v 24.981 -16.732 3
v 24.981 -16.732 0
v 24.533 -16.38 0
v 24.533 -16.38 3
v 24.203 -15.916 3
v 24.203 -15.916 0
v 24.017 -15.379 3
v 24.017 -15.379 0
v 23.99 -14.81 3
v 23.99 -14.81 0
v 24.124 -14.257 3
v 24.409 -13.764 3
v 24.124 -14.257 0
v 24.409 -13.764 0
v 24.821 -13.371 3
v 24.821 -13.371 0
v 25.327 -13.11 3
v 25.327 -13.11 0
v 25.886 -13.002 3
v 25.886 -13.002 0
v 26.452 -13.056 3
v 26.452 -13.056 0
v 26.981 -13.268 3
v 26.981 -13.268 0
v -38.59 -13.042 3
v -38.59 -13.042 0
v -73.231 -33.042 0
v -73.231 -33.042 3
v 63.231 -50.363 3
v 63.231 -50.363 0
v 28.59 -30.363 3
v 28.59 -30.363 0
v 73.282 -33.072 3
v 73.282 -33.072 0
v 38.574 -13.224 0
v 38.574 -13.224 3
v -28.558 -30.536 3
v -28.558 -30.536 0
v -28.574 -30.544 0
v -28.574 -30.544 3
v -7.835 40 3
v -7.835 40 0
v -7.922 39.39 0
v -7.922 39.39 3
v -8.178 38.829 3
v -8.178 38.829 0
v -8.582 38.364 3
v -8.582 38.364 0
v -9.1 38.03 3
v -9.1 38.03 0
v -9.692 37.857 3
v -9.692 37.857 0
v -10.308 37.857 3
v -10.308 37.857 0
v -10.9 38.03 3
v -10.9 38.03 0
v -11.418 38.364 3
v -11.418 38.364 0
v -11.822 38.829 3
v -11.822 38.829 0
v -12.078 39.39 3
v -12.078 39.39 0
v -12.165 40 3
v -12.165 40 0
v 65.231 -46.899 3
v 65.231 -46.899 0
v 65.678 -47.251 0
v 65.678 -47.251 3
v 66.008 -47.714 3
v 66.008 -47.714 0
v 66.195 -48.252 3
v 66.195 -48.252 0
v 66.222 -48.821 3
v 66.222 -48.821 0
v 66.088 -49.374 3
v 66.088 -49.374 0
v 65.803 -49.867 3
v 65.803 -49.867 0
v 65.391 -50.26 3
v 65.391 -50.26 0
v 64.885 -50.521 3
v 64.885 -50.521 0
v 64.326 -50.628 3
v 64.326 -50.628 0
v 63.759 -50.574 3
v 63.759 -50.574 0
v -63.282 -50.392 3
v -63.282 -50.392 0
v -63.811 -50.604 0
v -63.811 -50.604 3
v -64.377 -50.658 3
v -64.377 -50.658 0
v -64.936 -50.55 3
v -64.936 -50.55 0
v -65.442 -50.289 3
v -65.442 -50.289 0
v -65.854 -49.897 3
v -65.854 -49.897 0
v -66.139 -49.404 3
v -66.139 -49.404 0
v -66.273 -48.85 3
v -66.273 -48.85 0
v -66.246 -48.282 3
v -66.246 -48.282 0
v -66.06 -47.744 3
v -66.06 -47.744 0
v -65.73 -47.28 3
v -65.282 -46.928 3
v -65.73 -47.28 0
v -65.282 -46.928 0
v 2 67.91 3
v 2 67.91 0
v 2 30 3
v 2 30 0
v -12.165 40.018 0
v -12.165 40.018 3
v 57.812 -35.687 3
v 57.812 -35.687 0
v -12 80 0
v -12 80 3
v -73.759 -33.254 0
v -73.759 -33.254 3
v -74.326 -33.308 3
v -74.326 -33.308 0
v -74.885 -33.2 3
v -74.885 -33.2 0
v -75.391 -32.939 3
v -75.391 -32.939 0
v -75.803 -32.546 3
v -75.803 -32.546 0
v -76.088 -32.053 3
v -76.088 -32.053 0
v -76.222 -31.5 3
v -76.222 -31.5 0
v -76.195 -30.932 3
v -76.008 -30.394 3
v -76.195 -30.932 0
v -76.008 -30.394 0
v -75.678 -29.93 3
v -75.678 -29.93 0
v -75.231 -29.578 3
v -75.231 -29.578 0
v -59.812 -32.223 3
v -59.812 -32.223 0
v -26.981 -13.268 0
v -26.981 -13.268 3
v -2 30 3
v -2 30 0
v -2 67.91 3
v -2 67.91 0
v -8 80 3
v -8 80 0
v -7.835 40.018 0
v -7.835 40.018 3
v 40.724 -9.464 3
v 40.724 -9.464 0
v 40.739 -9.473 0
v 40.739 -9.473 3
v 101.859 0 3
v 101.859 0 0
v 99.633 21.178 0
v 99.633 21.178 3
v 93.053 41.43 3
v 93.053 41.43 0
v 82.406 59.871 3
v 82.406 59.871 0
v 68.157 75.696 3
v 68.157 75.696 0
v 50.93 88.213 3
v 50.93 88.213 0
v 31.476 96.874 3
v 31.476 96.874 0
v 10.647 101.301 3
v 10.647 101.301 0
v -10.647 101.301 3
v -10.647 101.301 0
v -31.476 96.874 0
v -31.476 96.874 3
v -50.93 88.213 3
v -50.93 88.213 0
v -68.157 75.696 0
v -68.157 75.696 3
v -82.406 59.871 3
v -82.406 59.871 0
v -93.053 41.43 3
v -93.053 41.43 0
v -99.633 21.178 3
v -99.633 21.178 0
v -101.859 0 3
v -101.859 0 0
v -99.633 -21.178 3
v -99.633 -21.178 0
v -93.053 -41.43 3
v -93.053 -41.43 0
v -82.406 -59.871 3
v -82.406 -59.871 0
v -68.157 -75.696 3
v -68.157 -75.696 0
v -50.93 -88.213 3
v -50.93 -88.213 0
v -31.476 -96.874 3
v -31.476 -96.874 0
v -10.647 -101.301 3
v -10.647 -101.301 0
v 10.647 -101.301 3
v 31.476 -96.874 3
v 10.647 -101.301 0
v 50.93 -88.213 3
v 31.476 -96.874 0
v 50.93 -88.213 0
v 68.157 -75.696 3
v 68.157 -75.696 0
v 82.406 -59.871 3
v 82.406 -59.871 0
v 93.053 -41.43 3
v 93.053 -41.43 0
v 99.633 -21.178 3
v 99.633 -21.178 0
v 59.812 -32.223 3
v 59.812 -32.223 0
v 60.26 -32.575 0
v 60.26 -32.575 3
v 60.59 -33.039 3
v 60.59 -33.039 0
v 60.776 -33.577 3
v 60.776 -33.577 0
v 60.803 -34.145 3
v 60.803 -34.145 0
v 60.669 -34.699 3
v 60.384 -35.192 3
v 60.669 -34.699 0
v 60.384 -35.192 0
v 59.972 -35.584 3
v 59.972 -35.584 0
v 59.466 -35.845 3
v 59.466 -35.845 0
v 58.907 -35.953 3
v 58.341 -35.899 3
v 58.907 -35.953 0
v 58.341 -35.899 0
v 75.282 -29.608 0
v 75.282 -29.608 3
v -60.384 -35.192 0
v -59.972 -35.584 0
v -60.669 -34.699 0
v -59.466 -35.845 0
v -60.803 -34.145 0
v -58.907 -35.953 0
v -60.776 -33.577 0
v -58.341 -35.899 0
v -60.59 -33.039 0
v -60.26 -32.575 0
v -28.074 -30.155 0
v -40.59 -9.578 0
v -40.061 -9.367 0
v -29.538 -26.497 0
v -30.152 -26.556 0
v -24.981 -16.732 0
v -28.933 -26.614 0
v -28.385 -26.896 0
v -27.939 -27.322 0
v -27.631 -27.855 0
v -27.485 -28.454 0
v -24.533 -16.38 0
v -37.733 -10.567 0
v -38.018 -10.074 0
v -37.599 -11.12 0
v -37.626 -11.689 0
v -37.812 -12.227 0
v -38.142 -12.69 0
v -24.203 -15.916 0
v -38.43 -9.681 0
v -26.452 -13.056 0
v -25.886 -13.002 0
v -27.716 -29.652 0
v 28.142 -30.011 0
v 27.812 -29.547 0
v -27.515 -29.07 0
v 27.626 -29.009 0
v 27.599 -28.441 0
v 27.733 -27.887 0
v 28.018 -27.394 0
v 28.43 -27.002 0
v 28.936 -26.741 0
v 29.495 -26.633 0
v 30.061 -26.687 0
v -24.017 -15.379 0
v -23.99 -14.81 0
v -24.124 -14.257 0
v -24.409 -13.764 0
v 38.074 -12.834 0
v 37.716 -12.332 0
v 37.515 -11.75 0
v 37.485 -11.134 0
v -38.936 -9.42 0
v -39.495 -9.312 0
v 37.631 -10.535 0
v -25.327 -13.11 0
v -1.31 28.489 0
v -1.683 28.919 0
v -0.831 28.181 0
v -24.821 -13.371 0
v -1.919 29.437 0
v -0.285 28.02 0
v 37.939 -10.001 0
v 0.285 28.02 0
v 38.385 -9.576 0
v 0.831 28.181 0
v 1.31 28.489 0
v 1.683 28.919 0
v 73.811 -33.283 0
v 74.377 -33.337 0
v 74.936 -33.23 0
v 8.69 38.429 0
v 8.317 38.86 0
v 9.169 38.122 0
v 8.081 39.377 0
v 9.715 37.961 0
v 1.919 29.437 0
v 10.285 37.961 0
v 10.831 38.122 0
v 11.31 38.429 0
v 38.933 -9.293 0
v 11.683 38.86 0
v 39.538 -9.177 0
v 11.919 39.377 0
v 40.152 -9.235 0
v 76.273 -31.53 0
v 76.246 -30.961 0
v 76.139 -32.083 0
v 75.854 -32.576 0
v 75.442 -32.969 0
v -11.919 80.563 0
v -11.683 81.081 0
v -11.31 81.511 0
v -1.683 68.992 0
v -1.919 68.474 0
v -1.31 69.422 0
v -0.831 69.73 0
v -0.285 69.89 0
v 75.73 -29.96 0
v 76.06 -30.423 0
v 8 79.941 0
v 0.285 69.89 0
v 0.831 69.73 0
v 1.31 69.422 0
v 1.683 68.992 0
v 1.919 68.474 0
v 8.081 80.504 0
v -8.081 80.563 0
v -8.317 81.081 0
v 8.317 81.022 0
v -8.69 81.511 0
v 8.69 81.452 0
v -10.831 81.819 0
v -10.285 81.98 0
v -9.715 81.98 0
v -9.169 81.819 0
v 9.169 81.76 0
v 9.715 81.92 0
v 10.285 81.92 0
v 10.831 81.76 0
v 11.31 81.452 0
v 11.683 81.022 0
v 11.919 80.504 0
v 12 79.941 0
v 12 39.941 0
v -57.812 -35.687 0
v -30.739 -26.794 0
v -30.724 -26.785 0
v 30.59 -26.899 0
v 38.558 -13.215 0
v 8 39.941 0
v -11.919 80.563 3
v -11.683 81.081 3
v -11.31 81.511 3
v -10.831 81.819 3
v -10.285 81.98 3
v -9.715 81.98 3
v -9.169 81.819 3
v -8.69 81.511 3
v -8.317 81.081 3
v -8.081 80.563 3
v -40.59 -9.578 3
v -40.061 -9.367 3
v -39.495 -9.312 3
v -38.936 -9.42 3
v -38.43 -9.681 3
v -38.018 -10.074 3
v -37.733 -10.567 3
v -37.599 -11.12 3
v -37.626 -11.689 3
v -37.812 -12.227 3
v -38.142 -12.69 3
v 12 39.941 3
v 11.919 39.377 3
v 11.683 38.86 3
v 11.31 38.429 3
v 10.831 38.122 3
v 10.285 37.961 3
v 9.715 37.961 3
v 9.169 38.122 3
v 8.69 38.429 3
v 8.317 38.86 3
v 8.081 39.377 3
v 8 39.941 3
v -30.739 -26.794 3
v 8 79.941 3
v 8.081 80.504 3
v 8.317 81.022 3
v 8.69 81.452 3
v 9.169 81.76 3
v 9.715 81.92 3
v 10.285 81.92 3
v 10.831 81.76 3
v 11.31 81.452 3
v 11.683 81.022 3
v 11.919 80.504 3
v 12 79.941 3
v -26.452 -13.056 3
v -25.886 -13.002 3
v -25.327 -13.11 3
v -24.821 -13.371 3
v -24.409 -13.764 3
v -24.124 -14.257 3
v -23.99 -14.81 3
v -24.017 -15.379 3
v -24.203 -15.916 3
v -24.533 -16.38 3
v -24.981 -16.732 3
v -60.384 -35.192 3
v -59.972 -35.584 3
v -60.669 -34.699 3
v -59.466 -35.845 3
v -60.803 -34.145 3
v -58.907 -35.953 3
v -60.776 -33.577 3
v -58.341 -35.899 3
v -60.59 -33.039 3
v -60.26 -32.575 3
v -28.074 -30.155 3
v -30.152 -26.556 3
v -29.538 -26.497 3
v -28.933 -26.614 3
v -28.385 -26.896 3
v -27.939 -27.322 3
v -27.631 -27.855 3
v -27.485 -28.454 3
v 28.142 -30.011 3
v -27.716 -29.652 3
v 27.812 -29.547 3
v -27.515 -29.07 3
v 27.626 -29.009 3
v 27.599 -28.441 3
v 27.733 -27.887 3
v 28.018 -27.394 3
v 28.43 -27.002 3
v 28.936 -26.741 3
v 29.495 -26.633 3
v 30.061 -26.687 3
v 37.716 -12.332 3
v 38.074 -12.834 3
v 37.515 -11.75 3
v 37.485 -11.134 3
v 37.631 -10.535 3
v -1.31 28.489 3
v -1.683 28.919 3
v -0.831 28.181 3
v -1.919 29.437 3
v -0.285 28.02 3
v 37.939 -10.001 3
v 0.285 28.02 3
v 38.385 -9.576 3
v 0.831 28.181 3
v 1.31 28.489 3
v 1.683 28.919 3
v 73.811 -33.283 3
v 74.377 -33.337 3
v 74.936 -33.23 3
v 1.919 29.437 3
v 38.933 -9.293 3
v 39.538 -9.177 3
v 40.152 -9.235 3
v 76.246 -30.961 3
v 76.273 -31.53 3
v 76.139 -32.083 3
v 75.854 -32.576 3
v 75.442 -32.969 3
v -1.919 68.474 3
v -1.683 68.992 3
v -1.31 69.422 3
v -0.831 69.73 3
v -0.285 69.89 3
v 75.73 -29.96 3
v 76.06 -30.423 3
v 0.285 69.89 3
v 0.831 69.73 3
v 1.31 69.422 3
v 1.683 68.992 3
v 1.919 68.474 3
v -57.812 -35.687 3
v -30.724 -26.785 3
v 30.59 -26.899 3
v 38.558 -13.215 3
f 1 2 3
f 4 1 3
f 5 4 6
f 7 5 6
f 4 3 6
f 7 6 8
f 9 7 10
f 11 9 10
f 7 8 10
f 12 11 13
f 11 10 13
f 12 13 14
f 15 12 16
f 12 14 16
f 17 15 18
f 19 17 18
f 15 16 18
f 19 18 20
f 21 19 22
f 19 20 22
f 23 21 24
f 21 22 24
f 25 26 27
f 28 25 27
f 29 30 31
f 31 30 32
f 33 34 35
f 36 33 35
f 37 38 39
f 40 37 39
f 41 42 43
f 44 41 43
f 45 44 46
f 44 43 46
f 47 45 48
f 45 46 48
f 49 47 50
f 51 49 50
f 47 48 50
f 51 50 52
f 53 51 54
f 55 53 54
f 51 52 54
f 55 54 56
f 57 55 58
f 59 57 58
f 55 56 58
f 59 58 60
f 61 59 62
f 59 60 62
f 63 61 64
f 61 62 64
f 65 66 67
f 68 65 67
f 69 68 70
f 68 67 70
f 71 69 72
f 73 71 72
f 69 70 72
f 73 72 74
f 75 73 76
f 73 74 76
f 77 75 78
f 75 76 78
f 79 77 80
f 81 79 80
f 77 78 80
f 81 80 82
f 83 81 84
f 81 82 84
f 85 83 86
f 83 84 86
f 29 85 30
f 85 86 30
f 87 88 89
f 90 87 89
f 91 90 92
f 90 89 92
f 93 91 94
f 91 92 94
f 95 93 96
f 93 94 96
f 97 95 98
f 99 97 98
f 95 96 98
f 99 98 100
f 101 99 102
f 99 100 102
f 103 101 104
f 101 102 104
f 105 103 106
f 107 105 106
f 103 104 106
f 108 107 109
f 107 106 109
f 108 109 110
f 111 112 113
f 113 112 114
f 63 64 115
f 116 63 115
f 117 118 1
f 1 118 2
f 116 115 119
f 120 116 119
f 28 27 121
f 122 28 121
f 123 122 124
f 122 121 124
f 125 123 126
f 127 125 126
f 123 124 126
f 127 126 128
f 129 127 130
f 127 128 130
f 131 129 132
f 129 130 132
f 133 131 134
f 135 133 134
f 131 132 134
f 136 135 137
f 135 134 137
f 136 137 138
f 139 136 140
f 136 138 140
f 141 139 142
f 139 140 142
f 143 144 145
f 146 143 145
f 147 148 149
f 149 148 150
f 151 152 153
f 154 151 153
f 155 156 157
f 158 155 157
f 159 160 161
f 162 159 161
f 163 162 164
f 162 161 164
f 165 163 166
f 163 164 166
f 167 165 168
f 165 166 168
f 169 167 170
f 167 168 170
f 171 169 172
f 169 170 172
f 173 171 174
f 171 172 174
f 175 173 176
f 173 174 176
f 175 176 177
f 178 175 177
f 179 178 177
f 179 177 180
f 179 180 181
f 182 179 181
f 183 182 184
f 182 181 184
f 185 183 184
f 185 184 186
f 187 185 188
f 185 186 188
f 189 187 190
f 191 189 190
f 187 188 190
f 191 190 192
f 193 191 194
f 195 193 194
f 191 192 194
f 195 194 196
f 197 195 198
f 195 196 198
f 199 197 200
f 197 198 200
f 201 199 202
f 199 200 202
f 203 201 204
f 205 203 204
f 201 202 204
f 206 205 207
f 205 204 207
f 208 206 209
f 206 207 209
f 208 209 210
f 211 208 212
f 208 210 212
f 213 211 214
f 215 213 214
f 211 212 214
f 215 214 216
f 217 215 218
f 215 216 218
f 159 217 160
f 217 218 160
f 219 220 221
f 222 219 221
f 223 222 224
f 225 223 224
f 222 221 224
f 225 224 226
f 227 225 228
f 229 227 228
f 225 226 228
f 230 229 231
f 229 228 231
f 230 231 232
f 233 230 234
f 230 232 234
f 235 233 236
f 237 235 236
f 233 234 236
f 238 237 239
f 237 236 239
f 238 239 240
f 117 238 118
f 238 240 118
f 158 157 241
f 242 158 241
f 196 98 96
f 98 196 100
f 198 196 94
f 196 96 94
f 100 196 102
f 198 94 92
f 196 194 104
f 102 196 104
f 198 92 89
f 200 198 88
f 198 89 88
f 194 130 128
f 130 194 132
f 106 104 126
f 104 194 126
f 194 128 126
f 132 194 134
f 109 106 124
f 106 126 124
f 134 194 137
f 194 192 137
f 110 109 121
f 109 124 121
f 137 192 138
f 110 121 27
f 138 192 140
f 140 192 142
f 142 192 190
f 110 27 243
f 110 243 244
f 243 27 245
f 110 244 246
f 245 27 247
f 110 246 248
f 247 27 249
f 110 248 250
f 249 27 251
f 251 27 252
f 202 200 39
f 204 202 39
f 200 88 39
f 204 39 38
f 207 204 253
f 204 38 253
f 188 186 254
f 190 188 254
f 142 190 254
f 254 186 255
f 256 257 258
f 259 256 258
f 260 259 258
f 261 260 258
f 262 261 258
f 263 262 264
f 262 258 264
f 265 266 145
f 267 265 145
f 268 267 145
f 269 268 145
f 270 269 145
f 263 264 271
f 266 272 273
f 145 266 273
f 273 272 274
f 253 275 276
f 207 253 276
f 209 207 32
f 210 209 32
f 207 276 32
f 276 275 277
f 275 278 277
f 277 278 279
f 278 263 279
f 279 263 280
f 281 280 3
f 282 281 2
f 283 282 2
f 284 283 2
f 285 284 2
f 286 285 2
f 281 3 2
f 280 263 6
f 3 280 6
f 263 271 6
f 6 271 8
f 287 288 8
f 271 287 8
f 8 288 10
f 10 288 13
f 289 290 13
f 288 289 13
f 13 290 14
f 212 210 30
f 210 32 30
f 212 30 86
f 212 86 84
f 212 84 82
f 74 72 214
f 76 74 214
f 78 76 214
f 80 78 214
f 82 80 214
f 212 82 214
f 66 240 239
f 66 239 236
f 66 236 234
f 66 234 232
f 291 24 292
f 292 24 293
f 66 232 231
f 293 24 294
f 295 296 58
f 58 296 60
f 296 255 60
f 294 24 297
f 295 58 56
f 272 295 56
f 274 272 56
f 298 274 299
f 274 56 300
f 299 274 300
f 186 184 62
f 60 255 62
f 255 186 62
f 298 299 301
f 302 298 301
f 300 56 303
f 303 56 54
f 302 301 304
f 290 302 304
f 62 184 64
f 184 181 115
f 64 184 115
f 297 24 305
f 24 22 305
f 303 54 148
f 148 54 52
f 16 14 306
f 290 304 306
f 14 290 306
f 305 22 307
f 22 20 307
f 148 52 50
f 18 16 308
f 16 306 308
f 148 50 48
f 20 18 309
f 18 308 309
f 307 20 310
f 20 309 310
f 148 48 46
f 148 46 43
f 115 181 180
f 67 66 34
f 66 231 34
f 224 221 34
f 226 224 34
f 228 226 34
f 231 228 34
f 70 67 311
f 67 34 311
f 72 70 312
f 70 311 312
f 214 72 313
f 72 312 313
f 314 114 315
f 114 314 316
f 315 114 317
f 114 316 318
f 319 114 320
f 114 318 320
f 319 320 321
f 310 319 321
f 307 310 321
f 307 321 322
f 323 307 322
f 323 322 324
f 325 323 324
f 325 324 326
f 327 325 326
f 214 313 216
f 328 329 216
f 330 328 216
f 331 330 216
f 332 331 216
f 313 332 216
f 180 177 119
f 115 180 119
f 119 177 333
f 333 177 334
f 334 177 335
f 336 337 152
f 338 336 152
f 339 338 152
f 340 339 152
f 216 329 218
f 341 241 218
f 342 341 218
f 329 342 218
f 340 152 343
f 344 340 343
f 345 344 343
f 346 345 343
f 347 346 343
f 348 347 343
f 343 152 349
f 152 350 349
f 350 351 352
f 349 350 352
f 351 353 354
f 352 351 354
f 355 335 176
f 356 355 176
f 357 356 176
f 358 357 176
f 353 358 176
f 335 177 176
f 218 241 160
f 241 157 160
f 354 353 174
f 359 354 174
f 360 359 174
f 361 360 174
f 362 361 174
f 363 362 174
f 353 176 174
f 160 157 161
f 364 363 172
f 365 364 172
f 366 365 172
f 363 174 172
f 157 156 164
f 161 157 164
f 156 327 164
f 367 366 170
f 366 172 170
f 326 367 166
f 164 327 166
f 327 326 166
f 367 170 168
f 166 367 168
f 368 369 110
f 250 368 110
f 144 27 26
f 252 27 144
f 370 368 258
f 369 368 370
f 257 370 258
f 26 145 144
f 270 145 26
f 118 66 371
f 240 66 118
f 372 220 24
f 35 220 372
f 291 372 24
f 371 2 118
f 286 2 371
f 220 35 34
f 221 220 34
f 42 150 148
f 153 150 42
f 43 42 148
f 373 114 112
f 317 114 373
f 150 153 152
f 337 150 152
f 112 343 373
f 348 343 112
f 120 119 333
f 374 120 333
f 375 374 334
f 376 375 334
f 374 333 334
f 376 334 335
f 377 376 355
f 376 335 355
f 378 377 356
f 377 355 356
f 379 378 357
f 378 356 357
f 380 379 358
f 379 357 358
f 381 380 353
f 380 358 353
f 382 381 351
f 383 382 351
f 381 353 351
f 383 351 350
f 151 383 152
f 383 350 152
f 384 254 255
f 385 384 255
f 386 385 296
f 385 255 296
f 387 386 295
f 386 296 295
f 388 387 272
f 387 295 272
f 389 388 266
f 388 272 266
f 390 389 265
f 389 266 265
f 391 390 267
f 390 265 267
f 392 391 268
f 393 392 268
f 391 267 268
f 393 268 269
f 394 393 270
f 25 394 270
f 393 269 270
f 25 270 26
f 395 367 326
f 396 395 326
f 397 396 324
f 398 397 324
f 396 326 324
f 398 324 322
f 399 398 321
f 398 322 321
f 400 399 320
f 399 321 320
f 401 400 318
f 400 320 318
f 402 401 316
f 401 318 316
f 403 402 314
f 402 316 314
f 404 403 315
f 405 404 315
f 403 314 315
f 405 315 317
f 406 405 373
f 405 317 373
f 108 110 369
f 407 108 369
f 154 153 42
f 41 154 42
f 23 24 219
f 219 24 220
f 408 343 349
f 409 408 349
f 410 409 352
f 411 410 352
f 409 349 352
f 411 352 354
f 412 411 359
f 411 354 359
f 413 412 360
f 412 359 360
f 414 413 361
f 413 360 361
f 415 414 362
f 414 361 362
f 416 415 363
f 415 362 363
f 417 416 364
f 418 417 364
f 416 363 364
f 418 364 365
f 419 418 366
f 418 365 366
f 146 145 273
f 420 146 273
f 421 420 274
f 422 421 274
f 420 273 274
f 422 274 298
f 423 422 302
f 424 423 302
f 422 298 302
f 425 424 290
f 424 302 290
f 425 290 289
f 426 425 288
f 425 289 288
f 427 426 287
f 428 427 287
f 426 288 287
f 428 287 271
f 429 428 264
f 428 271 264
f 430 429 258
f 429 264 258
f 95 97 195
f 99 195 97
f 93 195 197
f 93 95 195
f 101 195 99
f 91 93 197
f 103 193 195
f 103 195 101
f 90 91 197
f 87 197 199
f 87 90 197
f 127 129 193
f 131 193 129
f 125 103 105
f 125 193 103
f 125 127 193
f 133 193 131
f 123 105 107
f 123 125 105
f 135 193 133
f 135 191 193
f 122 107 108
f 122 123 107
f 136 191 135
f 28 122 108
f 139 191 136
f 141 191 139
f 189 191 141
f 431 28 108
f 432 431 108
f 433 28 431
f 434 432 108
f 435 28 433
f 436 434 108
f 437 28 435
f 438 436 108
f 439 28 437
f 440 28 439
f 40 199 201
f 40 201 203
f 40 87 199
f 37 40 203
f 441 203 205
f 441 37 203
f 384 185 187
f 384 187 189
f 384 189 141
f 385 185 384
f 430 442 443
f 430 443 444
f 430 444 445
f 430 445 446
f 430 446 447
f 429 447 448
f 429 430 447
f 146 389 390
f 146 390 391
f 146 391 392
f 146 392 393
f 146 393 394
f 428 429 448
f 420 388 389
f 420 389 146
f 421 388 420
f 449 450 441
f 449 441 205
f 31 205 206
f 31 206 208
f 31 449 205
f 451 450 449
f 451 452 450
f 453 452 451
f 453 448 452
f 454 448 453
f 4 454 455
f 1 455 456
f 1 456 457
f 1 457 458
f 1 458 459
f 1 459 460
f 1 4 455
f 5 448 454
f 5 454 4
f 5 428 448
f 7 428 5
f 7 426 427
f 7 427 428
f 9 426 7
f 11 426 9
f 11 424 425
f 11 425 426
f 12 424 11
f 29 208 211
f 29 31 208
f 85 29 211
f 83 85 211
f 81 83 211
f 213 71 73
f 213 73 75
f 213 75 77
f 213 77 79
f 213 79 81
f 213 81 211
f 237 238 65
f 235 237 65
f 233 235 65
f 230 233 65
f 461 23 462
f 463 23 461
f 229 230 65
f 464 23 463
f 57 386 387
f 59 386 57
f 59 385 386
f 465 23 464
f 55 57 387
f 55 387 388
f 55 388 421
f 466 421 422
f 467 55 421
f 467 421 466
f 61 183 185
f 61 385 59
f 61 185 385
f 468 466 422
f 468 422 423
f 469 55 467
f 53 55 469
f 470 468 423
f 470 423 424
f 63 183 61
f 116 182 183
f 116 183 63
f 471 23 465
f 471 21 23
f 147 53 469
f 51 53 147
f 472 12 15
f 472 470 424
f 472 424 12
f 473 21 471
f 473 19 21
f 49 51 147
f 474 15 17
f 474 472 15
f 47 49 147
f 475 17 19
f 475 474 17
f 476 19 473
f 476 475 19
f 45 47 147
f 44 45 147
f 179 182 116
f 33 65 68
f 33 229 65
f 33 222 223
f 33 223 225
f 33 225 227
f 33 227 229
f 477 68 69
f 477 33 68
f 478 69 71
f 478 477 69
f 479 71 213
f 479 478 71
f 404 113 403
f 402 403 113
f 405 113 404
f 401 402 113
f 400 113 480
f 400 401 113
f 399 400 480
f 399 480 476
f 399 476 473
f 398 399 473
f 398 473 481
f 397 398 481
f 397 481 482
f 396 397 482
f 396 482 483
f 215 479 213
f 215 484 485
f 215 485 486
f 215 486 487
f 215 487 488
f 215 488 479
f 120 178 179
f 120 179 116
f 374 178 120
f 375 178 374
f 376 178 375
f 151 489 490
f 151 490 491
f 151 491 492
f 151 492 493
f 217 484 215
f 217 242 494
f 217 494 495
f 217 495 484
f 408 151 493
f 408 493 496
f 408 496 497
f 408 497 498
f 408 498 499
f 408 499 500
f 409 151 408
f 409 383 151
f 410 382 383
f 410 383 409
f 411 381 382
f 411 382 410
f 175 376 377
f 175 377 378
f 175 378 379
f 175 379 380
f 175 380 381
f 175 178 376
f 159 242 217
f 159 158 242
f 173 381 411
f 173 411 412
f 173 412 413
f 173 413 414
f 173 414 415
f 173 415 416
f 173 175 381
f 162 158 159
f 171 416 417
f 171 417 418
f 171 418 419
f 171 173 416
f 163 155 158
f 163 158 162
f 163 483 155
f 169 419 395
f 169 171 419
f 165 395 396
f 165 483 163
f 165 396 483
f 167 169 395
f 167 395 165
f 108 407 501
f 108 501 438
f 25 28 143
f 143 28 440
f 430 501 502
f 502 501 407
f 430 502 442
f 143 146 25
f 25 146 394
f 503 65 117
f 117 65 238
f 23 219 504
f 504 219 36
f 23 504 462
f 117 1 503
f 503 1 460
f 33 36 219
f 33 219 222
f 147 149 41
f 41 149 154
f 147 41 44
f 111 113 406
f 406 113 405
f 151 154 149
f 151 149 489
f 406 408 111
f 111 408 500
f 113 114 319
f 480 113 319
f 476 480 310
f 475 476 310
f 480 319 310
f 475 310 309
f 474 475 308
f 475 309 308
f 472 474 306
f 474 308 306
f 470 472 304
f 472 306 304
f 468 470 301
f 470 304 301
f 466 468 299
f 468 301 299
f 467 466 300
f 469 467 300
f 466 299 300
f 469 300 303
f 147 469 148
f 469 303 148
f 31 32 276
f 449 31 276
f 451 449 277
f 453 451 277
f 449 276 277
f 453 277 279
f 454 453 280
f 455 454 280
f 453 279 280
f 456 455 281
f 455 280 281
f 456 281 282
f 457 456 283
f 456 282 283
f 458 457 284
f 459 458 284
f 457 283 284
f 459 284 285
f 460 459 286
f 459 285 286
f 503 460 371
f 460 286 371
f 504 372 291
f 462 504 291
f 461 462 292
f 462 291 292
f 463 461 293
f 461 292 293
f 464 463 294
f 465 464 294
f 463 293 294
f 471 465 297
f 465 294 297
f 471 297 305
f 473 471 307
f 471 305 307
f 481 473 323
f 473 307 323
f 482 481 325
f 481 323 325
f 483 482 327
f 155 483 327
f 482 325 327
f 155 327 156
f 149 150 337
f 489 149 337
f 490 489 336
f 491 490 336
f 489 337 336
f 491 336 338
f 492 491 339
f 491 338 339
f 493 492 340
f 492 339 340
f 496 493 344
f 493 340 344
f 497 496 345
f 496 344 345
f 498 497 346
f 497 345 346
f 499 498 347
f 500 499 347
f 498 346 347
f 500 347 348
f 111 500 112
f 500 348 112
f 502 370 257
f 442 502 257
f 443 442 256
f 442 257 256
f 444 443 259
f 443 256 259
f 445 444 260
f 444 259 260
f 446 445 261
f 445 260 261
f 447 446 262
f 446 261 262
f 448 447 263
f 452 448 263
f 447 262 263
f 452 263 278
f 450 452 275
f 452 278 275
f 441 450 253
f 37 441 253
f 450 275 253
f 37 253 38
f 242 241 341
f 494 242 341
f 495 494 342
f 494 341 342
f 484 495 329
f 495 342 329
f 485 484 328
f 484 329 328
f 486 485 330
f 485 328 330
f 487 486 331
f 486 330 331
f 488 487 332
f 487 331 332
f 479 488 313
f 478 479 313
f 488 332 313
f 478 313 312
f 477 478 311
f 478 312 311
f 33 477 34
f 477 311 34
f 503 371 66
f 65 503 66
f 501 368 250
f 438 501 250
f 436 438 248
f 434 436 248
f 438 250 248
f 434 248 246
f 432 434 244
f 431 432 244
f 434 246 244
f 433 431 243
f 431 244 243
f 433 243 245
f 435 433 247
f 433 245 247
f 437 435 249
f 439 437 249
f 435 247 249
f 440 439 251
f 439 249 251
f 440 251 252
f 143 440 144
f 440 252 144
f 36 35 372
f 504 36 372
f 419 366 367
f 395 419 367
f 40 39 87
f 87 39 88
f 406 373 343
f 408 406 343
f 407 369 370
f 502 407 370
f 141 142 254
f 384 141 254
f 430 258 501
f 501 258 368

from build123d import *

# Parameters (mm, degrees)
SKETCH1_R           = 101.859163579
BOSS_EXTRUDE1_DEPTH = 3


with BuildPart() as part:
    # Sketch1 → Boss-Extrude1 (new body)
    with BuildSketch(Plane.XY):
        Circle(SKETCH1_R)
        with BuildLine():
            Line((-38.589791853, -13.042222407), (-73.230808005, -33.042222407))
            ThreePointArc((-73.230808005, -33.042222407), (-75.962858812, -32.3101716), (-75.230808005, -29.578120792))
            Line((-75.230808005, -29.578120792), (-40.589791853, -9.578120792))
            ThreePointArc((-40.589791853, -9.578120792), (-37.857741046, -10.3101716), (-38.589791853, -13.042222407))
        make_face(mode=Mode.SUBTRACT)
        with BuildLine():
            Line((-28.573863011, -30.544431757), (-63.282032303, -50.392304845))
            ThreePointArc((-63.282032303, -50.392304845), (-66.01408311, -49.660254038), (-65.282032303, -46.92820323))
            Line((-65.282032303, -46.92820323), (-30.739185351, -26.793983449))
            Line((-30.739185351, -26.793983449), (-30.723714344, -26.78496576))
            ThreePointArc((-30.723714344, -26.78496576), (-27.765727873, -27.577555846), (-28.558317959, -30.535542316))
            Line((-28.558317959, -30.535542316), (-28.573863011, -30.544431757))
        make_face(mode=Mode.SUBTRACT)
        with BuildLine():
            Line((-24.980762114, -16.732050808), (-57.812135025, -35.687252796))
            ThreePointArc((-57.812135025, -35.687252796), (-60.544185832, -34.955201988), (-59.812135025, -32.223151181))
            Line((-59.812135025, -32.223151181), (-26.980762114, -13.267949192))
            ThreePointArc((-26.980762114, -13.267949192), (-24.248711306, -14), (-24.980762114, -16.732050808))
        make_face(mode=Mode.SUBTRACT)
        with BuildLine():
            Line((30.589791853, -26.898628868), (65.230808005, -46.898628868))
            ThreePointArc((65.230808005, -46.898628868), (65.962858812, -49.630679675), (63.230808005, -50.362730483))
            Line((63.230808005, -50.362730483), (28.589791853, -30.362730483))
            ThreePointArc((28.589791853, -30.362730483), (27.857741046, -27.630679675), (30.589791853, -26.898628868))
        make_face(mode=Mode.SUBTRACT)
        with BuildLine():
            Line((26.980762114, -13.267949192), (59.812135025, -32.223151181))
            ThreePointArc((59.812135025, -32.223151181), (60.544185832, -34.955201988), (57.812135025, -35.687252796))
            Line((57.812135025, -35.687252796), (24.980762114, -16.732050808))
            ThreePointArc((24.980762114, -16.732050808), (24.248711306, -14), (26.980762114, -13.267949192))
        make_face(mode=Mode.SUBTRACT)
        with BuildLine():
            Line((40.739185351, -9.473475374), (75.282032303, -29.607695155))
            ThreePointArc((75.282032303, -29.607695155), (76.01408311, -32.339745962), (73.282032303, -33.07179677))
            Line((73.282032303, -33.07179677), (38.573863011, -13.223923681))
            Line((38.573863011, -13.223923681), (38.558317959, -13.21503424))
            ThreePointArc((38.558317959, -13.21503424), (37.765727873, -10.25704777), (40.723714344, -9.464457684))
            Line((40.723714344, -9.464457684), (40.739185351, -9.473475374))
        make_face(mode=Mode.SUBTRACT)
        with BuildLine():
            Line((-2, 30), (-2, 67.910403976))
            ThreePointArc((-2, 67.910403976), (0, 69.910403976), (2, 67.910403976))
            Line((2, 67.910403976), (2, 30))
            ThreePointArc((2, 30), (0, 28), (-2, 30))
        make_face(mode=Mode.SUBTRACT)
        with BuildLine():
            Line((-12.16532234, 40.01790713), (-12, 80))
            ThreePointArc((-12, 80), (-10, 82), (-8, 80))
            Line((-8, 80), (-7.83467766, 40.01790713))
            Line((-7.83467766, 40.01790713), (-7.834603616, 40))
            ThreePointArc((-7.834603616, 40), (-10, 37.834603616), (-12.165396384, 40))
            Line((-12.165396384, 40), (-12.16532234, 40.01790713))
        make_face(mode=Mode.SUBTRACT)
        with BuildLine():
            Line((8, 39.940851275), (8, 79.940851275))
            ThreePointArc((8, 79.940851275), (10, 81.940851275), (12, 79.940851275))
            Line((12, 79.940851275), (12, 39.940851275))
            ThreePointArc((12, 39.940851275), (10, 37.940851275), (8, 39.940851275))
        make_face(mode=Mode.SUBTRACT)
    extrude(amount=BOSS_EXTRUDE1_DEPTH)


solid = part.part
